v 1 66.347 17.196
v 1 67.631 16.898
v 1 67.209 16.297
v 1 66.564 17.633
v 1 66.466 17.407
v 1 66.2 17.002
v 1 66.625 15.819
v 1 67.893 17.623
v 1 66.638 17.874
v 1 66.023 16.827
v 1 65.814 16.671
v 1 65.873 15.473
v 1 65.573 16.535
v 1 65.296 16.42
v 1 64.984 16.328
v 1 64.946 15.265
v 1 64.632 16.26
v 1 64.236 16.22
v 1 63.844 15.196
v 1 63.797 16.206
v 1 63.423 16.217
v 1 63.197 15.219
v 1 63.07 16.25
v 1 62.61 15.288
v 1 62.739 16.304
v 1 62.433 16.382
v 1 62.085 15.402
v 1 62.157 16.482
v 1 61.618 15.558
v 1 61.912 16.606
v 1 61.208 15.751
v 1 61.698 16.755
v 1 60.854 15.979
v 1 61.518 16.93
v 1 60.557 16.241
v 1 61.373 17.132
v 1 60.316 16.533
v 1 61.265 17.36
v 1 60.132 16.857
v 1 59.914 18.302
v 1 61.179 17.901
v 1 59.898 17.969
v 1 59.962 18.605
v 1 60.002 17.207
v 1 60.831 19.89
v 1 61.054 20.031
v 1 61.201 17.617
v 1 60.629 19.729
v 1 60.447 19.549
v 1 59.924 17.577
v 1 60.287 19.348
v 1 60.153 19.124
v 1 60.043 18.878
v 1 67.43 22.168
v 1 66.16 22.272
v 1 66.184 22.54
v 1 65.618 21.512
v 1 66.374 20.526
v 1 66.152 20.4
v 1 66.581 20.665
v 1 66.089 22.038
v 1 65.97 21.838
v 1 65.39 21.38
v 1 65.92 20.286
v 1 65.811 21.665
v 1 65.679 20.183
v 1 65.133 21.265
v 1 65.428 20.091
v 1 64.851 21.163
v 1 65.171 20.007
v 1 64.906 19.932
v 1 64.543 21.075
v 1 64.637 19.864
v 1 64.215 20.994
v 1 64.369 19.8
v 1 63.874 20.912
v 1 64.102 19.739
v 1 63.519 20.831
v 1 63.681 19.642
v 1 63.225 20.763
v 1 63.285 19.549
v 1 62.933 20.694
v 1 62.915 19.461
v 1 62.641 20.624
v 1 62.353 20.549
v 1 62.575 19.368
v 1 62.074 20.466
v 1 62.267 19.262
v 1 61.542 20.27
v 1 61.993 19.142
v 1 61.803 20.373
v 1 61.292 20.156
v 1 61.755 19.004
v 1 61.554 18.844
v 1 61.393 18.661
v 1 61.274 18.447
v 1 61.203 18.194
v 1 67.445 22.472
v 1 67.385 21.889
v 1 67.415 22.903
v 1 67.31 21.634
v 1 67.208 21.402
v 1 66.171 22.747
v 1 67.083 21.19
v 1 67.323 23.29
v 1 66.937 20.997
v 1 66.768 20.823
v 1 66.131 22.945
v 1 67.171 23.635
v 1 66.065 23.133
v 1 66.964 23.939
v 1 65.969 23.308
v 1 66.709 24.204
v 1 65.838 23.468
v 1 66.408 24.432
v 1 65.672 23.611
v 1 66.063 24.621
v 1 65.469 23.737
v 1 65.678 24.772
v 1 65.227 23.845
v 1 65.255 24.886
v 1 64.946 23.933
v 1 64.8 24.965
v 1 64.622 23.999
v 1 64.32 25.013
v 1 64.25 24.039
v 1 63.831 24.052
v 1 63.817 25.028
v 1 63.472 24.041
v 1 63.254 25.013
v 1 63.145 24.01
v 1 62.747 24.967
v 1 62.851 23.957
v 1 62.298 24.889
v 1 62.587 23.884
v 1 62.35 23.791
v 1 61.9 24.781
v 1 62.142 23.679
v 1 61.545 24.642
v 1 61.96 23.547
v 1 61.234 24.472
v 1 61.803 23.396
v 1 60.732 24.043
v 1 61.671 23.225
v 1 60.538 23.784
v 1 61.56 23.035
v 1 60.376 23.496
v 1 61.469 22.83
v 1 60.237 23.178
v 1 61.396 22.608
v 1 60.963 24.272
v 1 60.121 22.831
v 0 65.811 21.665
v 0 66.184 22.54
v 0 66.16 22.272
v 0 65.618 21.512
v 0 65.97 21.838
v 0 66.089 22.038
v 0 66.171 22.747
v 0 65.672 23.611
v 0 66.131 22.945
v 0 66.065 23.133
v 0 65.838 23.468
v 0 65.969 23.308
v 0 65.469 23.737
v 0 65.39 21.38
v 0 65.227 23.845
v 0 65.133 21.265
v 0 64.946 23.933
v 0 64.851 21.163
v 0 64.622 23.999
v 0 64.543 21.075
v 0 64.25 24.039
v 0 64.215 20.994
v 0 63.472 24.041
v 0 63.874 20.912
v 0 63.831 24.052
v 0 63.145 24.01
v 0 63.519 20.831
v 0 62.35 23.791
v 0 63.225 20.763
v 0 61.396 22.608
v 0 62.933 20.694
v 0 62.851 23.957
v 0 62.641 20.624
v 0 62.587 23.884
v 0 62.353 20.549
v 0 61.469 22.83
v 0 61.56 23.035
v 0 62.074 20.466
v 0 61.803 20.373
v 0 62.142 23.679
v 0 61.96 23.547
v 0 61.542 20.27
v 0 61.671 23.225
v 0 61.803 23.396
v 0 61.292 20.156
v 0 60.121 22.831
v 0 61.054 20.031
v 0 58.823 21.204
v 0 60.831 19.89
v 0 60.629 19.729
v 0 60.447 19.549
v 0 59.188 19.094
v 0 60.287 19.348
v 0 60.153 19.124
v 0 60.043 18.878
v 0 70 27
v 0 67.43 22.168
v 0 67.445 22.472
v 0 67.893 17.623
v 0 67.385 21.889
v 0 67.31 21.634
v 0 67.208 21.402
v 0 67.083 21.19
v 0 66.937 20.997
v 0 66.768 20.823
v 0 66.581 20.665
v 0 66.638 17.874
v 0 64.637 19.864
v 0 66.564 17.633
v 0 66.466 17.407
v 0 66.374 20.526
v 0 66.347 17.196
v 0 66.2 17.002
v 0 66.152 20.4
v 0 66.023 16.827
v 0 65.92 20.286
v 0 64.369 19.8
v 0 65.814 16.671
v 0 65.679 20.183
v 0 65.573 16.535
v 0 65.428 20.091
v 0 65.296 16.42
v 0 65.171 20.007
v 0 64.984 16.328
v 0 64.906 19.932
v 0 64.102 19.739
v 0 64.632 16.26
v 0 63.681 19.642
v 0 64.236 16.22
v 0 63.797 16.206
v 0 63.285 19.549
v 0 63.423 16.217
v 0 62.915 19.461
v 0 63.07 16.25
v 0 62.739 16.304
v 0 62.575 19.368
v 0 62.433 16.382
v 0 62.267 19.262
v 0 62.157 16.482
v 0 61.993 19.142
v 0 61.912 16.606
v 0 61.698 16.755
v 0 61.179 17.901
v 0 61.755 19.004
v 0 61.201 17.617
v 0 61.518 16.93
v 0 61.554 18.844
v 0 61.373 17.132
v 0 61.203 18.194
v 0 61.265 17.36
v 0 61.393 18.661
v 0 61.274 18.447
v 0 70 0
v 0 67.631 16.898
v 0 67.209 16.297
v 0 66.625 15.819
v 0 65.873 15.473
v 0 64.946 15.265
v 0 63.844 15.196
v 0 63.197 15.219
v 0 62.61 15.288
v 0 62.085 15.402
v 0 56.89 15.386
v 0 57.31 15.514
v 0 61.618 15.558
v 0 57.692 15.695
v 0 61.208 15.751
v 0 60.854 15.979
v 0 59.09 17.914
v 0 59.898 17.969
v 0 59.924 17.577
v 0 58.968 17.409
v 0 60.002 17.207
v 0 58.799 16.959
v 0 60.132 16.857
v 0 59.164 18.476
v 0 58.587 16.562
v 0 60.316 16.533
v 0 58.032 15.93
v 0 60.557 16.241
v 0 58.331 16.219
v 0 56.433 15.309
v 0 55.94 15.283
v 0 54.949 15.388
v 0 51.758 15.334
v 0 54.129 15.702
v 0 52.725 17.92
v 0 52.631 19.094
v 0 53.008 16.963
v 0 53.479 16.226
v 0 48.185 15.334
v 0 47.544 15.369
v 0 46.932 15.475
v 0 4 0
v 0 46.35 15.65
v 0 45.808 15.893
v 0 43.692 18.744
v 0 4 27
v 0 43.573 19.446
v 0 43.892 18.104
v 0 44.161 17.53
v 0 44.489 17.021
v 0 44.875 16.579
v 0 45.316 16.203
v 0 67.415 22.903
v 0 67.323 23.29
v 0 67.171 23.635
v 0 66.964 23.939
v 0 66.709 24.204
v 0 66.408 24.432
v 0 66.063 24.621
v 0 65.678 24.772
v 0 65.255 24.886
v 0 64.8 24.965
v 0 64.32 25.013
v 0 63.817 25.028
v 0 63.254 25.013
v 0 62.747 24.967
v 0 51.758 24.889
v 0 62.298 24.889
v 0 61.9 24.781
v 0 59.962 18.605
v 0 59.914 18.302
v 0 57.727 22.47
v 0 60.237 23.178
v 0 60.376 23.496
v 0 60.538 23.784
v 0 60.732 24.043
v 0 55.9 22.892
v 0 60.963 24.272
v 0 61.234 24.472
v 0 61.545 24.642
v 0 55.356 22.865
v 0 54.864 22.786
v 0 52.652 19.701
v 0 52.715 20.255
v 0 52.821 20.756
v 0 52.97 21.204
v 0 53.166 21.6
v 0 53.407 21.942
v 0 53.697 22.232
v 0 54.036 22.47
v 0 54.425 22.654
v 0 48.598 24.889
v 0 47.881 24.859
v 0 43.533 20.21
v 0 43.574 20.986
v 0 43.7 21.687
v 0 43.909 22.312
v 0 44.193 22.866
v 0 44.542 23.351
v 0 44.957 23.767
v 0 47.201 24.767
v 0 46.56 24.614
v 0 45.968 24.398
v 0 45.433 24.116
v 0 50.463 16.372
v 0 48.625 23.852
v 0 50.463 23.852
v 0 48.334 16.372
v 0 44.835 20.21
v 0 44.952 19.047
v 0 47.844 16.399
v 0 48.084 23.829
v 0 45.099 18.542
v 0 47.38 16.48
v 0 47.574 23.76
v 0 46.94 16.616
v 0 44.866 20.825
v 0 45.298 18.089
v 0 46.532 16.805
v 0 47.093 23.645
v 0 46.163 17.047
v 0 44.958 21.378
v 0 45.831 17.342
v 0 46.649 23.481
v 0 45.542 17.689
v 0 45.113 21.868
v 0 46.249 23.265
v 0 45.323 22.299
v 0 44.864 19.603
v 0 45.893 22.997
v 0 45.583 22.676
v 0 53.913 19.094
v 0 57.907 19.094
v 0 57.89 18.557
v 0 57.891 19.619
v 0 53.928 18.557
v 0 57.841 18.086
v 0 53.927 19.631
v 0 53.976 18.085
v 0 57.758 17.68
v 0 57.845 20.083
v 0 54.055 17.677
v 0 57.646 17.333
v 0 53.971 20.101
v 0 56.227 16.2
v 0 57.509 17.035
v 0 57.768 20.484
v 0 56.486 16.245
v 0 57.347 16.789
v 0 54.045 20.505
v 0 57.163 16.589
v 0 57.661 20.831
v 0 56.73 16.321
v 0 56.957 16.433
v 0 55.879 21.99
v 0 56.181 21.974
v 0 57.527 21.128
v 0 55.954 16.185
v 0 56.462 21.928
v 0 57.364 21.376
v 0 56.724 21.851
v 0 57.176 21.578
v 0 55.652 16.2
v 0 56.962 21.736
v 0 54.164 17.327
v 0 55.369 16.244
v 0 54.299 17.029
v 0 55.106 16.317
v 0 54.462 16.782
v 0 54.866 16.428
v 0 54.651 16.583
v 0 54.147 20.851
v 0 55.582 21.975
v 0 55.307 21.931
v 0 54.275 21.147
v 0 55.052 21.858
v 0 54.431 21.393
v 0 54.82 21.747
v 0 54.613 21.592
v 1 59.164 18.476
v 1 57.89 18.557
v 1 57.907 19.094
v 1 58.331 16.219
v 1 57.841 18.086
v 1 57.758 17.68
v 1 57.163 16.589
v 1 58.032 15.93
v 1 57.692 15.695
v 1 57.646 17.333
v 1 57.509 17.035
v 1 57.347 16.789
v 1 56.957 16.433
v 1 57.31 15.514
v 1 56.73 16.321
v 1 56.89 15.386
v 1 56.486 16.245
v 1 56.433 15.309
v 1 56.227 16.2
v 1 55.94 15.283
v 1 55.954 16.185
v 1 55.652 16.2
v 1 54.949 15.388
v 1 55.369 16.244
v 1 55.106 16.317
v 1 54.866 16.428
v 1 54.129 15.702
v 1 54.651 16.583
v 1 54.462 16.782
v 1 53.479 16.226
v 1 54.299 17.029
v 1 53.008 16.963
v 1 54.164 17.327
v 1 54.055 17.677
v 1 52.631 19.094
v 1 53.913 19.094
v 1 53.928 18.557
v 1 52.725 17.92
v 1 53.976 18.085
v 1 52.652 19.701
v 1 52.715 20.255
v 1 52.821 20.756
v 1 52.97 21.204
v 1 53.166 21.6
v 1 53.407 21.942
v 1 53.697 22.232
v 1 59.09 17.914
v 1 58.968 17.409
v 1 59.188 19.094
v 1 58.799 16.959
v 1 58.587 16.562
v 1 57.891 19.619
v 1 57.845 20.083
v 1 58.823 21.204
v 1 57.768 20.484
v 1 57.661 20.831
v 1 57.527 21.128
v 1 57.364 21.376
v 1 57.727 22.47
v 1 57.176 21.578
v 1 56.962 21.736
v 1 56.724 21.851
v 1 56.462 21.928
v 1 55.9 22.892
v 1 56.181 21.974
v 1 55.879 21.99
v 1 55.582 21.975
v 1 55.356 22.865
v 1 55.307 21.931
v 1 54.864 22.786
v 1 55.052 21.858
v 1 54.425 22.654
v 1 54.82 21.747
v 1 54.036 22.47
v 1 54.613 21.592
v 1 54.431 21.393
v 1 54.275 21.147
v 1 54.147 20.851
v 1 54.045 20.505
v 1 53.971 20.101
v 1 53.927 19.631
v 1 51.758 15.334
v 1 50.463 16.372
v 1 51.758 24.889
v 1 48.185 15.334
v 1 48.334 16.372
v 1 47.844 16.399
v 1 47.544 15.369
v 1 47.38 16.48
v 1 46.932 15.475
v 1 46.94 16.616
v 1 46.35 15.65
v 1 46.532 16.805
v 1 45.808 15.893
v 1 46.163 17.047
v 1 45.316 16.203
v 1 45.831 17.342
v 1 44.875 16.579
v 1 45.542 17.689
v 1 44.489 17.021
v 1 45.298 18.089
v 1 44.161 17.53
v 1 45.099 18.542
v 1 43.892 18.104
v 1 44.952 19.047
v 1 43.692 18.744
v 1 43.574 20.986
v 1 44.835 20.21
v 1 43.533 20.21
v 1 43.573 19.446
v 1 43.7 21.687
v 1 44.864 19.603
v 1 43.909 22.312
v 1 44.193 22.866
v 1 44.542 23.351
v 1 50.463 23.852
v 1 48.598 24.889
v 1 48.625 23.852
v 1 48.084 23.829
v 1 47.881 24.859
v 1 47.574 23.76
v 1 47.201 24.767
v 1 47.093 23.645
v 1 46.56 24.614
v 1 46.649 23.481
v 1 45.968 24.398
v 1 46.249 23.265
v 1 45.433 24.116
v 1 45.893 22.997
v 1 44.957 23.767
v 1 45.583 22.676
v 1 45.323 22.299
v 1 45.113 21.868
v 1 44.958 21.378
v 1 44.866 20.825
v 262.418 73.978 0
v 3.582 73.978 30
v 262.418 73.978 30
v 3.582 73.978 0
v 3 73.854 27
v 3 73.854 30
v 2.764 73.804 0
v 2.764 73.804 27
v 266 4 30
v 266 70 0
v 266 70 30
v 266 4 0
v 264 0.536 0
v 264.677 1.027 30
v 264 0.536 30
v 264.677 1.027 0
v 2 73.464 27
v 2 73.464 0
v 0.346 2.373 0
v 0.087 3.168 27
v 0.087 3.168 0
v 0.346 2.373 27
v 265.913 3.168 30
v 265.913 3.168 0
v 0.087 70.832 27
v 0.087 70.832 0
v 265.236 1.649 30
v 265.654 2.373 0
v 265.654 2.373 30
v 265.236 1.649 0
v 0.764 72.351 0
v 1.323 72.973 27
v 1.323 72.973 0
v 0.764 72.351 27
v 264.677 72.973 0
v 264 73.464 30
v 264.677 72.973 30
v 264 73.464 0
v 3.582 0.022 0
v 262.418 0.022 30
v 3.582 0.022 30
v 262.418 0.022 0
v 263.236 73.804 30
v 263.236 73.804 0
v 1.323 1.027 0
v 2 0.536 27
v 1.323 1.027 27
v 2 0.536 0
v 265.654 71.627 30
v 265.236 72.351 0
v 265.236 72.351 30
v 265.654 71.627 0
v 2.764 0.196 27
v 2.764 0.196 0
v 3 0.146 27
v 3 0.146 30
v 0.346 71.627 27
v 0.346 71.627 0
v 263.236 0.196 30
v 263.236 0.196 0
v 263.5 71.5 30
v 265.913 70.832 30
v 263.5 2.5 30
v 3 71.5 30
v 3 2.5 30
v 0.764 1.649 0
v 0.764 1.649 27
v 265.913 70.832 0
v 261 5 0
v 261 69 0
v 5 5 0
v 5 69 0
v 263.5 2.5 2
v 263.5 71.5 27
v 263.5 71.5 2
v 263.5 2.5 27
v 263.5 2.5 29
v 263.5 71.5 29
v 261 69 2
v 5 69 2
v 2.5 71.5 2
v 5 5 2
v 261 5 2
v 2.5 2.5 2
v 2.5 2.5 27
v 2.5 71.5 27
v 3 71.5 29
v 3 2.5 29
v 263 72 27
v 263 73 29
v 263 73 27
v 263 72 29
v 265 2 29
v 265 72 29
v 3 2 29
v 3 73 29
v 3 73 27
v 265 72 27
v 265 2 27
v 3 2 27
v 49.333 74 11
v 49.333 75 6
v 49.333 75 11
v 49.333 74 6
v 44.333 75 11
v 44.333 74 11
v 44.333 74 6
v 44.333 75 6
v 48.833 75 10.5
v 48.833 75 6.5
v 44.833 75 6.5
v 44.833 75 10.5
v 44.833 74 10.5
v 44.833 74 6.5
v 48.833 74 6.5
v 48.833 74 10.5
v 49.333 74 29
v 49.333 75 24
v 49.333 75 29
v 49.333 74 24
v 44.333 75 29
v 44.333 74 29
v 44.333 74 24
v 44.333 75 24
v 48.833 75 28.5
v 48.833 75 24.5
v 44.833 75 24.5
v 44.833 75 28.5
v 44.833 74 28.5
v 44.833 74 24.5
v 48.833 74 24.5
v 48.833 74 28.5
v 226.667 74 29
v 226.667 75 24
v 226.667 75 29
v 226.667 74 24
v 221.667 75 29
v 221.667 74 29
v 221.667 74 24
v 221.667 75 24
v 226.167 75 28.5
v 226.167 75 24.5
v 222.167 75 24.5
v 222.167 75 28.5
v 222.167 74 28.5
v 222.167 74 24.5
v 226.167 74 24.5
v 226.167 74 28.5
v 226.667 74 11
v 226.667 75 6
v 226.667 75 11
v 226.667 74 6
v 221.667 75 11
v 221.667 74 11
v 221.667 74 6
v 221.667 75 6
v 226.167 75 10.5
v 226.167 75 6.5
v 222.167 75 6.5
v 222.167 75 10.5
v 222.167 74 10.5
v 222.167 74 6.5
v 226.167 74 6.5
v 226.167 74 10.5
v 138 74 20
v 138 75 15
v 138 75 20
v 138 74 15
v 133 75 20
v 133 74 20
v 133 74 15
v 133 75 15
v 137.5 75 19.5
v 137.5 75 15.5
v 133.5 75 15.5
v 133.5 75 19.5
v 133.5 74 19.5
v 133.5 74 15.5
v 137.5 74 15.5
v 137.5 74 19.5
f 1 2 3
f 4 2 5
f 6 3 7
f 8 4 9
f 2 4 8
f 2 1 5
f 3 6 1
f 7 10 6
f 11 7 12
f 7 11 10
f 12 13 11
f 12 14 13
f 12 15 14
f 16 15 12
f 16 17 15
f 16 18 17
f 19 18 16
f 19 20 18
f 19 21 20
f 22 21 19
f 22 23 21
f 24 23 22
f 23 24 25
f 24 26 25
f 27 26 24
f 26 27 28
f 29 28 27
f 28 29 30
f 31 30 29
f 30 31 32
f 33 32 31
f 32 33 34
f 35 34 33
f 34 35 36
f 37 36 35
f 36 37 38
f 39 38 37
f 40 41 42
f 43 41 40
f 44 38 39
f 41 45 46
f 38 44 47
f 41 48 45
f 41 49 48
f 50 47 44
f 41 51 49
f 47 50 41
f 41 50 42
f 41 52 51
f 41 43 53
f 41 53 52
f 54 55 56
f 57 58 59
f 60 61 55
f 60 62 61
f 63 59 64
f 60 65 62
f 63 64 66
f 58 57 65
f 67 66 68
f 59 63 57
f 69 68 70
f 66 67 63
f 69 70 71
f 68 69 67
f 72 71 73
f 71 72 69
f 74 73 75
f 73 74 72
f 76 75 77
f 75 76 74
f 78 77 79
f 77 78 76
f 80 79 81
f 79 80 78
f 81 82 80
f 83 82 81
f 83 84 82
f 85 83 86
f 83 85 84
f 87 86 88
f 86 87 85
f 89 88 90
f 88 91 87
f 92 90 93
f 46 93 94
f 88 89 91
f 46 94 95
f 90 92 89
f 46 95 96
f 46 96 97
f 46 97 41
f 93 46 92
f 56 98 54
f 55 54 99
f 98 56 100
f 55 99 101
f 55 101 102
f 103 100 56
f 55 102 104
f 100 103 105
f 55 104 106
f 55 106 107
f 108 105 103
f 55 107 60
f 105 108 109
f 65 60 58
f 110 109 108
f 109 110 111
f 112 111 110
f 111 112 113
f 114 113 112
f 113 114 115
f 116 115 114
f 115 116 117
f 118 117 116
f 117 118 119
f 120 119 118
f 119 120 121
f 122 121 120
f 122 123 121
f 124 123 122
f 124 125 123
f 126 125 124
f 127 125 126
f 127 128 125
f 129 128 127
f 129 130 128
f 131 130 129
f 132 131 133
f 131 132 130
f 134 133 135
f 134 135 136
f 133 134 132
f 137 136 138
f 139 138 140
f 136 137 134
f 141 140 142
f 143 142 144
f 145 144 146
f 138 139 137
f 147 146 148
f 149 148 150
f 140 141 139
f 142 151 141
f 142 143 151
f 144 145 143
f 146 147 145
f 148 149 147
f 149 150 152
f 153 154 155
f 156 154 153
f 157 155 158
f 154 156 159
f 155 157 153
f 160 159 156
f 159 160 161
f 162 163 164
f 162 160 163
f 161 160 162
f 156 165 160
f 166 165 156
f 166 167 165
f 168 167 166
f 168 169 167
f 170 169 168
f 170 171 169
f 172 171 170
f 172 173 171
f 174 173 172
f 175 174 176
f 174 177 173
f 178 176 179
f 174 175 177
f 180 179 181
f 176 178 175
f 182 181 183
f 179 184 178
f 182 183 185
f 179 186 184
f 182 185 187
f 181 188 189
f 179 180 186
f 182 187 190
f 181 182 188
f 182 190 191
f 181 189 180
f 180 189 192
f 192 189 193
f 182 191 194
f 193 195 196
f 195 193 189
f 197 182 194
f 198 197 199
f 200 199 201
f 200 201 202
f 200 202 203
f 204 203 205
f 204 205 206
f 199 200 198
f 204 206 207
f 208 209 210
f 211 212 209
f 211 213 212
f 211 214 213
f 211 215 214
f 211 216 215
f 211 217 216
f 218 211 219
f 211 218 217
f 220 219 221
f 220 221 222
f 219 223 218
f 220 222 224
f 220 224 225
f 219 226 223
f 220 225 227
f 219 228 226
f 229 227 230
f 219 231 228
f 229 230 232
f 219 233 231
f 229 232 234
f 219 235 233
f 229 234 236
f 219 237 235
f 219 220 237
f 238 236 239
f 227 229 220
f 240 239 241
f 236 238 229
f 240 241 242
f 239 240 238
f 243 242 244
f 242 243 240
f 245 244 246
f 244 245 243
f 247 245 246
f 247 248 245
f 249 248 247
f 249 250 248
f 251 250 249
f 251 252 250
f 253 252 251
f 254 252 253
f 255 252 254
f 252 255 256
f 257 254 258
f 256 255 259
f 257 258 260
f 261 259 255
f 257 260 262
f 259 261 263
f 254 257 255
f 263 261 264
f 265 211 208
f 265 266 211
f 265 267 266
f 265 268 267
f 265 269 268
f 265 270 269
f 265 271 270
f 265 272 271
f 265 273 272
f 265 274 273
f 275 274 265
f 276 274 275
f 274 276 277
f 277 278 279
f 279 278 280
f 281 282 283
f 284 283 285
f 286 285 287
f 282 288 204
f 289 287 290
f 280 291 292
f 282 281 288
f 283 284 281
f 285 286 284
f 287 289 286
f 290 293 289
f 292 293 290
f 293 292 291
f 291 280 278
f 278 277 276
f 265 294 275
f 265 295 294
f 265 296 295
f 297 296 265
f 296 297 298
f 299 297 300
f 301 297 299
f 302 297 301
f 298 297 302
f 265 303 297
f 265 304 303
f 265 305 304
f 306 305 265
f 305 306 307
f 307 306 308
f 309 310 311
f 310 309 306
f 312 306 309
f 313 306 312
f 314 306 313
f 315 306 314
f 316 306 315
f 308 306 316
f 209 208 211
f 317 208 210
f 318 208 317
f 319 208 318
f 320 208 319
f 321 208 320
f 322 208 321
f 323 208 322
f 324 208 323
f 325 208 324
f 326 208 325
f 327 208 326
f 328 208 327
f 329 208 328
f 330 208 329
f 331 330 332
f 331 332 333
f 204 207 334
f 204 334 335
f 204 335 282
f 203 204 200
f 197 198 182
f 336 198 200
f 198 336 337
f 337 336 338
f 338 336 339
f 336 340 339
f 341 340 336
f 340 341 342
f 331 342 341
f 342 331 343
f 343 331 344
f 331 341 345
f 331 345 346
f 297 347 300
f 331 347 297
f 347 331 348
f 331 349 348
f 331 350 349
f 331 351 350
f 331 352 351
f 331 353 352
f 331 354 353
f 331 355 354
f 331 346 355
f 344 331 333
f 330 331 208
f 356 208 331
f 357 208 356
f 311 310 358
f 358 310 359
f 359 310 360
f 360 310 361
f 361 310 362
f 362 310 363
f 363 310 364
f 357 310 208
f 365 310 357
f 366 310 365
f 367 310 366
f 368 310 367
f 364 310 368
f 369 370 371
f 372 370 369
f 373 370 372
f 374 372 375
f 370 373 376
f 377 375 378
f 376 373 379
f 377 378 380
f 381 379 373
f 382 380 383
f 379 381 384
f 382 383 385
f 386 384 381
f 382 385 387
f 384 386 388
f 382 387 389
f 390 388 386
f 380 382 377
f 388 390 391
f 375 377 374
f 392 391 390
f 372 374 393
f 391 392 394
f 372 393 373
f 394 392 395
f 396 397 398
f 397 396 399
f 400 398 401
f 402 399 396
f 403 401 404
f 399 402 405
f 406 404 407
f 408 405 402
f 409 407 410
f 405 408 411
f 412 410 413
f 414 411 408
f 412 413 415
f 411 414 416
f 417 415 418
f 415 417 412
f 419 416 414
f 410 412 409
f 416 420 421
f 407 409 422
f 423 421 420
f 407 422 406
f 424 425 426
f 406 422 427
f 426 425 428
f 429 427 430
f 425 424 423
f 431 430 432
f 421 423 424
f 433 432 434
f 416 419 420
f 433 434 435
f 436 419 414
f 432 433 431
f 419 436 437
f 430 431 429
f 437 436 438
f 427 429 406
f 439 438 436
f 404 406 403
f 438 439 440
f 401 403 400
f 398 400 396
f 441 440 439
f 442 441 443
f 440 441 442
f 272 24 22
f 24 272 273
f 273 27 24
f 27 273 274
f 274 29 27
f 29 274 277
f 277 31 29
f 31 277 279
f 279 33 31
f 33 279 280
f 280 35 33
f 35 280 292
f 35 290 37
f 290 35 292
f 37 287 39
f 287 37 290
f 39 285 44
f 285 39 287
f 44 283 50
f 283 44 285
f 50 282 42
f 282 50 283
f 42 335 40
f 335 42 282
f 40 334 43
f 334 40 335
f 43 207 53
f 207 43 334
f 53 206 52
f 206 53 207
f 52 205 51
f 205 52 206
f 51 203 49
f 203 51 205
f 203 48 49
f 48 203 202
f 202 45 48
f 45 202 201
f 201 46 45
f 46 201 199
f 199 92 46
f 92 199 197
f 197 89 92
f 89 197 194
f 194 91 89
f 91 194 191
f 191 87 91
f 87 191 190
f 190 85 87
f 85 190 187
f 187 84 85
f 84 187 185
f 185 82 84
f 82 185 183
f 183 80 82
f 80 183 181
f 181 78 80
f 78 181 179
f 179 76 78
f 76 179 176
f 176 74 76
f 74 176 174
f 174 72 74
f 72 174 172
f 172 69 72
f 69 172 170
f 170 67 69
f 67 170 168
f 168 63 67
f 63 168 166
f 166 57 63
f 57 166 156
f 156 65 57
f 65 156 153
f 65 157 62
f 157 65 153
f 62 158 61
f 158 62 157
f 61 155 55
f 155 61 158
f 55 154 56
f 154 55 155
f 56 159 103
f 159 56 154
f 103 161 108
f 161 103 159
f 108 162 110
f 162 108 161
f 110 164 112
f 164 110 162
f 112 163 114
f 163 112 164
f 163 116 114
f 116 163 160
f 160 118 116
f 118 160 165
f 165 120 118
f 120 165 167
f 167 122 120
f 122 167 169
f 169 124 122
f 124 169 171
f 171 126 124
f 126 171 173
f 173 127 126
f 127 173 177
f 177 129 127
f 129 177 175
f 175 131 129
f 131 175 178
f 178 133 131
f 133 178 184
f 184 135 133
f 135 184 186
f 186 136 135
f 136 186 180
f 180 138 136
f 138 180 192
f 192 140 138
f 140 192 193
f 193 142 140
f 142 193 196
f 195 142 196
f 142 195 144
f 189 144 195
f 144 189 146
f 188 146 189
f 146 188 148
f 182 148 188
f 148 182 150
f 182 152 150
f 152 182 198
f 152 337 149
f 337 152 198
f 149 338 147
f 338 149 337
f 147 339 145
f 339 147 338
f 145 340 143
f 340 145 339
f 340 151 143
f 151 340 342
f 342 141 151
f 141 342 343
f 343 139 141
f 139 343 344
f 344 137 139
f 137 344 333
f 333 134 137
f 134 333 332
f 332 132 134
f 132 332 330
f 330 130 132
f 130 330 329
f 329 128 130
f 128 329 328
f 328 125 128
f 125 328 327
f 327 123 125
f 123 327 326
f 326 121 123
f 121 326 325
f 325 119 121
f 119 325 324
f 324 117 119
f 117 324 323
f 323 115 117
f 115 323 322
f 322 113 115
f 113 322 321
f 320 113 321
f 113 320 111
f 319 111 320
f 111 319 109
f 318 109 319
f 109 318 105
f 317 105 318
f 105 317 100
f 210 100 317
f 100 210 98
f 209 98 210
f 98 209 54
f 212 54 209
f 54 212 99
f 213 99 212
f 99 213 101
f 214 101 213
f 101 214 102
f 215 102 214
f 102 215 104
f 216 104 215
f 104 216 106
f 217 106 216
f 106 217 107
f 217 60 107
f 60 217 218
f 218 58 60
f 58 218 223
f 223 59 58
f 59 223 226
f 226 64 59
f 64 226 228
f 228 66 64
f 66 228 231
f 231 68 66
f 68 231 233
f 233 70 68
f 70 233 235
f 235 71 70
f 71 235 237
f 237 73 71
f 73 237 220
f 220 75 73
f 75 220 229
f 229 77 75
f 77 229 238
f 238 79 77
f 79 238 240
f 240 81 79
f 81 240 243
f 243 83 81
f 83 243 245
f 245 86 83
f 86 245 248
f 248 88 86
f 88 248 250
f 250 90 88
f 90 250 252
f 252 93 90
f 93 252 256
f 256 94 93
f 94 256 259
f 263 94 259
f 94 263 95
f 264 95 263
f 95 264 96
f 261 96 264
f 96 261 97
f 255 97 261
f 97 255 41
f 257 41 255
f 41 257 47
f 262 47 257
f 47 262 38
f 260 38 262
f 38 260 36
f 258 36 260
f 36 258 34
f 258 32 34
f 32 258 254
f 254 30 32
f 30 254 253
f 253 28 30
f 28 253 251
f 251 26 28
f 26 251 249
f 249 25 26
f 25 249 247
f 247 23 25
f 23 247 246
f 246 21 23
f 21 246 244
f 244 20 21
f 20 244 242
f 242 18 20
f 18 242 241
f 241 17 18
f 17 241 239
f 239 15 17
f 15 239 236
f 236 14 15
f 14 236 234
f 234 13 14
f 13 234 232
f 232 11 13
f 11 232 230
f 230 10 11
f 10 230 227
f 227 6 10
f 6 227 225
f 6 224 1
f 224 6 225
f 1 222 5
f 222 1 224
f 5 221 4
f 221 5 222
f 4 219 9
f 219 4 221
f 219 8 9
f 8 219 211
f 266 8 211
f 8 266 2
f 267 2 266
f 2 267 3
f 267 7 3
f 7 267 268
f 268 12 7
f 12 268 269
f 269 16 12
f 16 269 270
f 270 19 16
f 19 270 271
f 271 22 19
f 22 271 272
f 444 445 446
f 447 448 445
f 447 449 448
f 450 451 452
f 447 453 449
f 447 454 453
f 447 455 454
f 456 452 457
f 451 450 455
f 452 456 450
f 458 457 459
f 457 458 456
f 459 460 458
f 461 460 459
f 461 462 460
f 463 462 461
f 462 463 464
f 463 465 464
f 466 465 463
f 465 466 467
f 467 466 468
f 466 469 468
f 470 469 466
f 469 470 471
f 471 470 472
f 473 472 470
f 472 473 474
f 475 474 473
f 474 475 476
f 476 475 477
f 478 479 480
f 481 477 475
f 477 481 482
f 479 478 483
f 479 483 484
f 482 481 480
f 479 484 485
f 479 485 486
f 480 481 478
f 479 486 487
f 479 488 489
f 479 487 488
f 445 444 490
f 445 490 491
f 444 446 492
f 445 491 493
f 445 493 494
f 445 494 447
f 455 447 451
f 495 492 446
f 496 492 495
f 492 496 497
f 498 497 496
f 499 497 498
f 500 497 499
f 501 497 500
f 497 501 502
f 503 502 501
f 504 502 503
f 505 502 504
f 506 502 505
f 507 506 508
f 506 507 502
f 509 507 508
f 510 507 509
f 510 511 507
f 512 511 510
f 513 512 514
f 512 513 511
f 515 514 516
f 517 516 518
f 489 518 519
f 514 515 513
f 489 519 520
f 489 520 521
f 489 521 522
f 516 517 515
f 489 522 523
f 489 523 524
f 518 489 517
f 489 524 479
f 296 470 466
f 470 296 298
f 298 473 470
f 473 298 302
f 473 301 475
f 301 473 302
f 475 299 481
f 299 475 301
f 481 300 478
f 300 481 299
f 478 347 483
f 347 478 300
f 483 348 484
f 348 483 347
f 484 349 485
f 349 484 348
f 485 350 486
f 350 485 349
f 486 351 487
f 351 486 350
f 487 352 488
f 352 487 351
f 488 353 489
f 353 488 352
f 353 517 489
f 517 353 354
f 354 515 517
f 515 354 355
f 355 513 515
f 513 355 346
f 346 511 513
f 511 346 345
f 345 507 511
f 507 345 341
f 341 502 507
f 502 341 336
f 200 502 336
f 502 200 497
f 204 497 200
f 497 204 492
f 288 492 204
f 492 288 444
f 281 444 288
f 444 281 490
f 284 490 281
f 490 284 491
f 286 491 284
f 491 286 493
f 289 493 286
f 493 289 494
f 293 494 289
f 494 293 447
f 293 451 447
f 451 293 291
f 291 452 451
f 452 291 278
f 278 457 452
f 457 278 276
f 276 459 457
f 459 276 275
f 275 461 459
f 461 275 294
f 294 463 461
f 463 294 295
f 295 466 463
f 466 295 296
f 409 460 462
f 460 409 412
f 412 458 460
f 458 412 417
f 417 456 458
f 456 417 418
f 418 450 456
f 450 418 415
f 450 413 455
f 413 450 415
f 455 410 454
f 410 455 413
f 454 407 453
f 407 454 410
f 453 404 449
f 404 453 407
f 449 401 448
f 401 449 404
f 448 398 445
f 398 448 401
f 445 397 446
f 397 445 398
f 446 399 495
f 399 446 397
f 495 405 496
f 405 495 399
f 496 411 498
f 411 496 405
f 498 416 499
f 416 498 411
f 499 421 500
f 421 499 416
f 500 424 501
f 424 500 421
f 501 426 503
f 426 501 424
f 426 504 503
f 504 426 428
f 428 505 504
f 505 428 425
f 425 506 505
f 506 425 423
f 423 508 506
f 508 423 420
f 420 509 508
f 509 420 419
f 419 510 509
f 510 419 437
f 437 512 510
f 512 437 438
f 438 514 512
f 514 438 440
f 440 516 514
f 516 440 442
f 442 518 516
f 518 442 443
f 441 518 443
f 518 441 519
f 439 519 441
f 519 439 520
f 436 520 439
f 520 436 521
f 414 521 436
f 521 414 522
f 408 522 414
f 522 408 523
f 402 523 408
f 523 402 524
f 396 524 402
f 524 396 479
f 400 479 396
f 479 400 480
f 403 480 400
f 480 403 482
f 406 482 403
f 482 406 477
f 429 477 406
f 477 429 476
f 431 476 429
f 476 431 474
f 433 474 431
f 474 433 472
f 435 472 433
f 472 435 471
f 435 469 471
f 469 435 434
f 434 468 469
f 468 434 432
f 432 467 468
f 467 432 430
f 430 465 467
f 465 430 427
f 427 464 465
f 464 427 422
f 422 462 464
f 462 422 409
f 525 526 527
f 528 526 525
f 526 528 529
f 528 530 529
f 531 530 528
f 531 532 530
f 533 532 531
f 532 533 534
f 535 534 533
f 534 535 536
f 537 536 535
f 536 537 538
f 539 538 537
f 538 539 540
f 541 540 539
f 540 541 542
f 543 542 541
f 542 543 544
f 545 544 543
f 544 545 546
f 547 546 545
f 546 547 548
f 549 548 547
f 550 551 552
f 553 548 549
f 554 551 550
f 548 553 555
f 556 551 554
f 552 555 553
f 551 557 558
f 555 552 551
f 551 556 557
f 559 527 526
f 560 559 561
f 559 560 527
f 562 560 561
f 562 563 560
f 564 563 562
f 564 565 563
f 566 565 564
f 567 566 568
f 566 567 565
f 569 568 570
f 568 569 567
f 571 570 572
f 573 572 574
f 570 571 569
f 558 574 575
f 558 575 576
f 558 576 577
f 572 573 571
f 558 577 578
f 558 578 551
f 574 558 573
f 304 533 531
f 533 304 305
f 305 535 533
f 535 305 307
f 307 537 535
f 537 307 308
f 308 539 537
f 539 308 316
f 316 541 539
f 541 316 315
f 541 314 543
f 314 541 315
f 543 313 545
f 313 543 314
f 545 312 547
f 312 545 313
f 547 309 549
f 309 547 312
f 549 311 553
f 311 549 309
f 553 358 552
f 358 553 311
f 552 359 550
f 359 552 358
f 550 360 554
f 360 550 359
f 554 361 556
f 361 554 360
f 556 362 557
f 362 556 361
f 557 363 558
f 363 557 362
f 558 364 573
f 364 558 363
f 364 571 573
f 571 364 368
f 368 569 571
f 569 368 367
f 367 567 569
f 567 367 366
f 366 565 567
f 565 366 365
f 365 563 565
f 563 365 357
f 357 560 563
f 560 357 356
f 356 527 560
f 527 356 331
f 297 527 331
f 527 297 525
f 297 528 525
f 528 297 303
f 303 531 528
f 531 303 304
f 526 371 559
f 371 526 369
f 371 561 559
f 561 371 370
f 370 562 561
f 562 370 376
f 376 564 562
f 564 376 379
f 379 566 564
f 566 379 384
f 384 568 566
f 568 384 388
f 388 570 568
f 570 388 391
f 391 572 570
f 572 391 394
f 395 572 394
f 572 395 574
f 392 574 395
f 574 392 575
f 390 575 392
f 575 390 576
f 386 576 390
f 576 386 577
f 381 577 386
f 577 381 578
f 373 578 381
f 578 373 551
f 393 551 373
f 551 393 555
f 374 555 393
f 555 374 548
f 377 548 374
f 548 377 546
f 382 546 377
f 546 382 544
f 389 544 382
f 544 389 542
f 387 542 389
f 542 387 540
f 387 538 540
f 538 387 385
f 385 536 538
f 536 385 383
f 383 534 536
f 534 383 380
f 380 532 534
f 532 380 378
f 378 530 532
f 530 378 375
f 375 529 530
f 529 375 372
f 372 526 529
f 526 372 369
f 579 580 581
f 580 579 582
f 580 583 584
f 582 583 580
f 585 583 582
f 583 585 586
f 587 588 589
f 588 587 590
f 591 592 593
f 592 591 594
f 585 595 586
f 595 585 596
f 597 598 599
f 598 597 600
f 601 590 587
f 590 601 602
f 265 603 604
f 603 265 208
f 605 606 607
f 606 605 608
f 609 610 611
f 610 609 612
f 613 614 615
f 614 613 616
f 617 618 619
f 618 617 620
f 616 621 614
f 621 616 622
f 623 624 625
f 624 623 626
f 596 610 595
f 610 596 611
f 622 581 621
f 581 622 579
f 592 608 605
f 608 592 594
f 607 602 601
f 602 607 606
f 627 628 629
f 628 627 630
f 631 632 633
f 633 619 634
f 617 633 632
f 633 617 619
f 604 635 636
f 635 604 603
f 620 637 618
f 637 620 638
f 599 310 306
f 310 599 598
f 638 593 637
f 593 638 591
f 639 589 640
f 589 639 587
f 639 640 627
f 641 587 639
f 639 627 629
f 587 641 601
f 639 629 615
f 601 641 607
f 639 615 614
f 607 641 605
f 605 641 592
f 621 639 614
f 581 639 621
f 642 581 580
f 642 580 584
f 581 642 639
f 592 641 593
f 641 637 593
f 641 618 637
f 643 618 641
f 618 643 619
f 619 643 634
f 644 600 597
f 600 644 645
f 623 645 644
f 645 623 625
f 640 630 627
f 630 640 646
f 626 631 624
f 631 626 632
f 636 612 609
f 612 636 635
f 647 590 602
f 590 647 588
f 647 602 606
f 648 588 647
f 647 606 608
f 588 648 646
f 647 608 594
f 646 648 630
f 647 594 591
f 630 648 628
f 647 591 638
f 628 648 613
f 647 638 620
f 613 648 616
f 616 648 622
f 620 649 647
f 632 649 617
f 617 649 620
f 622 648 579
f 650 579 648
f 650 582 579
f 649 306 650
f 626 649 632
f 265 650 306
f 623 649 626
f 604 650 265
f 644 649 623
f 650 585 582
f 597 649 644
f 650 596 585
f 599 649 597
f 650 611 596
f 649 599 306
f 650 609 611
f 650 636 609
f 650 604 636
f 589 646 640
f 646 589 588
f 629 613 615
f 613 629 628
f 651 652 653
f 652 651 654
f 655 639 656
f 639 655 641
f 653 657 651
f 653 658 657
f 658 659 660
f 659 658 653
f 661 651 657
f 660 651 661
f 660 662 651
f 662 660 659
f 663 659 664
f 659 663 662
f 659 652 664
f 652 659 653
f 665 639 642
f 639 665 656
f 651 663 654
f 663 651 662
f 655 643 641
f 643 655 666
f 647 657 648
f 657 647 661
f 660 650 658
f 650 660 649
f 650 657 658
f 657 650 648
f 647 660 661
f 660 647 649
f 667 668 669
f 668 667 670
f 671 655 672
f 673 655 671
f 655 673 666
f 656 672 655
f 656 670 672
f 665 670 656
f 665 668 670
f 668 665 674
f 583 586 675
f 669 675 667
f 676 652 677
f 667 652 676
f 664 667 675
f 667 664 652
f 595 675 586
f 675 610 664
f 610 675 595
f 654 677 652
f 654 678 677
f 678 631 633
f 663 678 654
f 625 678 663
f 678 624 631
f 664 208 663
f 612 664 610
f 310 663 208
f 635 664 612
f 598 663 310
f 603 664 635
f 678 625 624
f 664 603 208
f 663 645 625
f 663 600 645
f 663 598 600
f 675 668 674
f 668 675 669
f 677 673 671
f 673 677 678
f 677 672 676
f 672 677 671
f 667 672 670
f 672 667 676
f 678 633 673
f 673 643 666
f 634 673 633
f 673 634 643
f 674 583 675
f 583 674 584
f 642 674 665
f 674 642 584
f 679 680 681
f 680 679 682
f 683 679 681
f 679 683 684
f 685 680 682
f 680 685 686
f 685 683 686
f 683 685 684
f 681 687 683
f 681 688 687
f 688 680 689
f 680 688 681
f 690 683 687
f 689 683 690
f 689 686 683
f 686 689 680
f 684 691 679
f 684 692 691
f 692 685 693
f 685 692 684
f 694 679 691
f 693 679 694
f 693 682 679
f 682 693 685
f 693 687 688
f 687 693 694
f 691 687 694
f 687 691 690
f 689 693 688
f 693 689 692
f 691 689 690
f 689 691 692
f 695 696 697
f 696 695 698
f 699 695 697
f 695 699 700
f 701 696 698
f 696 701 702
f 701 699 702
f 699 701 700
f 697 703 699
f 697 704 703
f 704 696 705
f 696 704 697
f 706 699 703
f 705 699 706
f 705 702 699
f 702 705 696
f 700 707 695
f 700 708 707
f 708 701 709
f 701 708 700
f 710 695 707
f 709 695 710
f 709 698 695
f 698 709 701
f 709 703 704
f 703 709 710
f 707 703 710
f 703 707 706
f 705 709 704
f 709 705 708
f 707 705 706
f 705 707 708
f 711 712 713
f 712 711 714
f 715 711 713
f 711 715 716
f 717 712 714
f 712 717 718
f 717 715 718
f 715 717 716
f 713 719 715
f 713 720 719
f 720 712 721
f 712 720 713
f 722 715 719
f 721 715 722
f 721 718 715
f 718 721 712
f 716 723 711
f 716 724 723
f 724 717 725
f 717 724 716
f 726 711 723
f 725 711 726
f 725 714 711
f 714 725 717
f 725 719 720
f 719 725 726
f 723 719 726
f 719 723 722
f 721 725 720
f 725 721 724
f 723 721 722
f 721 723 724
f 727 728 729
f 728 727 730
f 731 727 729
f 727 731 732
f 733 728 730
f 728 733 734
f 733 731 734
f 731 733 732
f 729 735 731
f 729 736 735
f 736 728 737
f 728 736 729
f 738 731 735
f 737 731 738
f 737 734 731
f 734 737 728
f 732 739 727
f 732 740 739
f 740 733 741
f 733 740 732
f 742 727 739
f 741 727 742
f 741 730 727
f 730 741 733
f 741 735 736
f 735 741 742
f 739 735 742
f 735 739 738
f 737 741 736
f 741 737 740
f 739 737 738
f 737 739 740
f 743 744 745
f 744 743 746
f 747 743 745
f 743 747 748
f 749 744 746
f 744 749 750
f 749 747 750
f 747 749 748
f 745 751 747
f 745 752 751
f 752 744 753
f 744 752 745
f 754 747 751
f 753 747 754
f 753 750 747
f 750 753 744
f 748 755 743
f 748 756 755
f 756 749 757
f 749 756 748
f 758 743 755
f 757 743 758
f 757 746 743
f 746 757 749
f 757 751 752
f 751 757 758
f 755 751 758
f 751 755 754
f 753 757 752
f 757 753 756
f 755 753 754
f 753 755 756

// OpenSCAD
$m_length = 256;
$m_width = 64;
$m_height = 15;

$margin_x = 5;
$margin_y = 5;

$margin = ([$margin_x,$margin_y,0]);

$wall_strength = 5;
$wall = ([$wall_strength,$wall_strength,0]);

$box_l = $m_length+$margin_x+$wall_strength;
$box_w = $m_width+$margin_y+$wall_strength;
$box_h = 30;

$matrix = ([$m_length,$m_width,$box_h]);

$stand = ([5,1,5]);


font = "Liberation Sans";
letter_size = 10;
letter_height = 1;



difference() {
    // full case
    roundedcube($matrix+$wall+$margin,false,4,"z");
    //remove matrix+margin
    
    translate([$wall_strength/2,$wall_strength/2,2]) { 
        cube($matrix+$margin);
    }
    //remove matrix
    translate([$wall_strength, $wall_strength,0]) { 
        cube($matrix);
    }
    
    // insert
    translate([0,2,$box_h-3]) {
         cube([$box_l-3,$box_w-3,2]);
    }
    translate([$box_l-3,2,$box_h-3]) {
        cube([2,$box_w-4,2]);
    }
    translate([0,0,$box_h-3]) {
        cube([$wall_strength-2,$box_w,6]);
    }
    
    translate ([1,$box_w-10,$box_h-10]) {
        rotate([90, 0, 270]){
            letter("\u0053");
        }
        translate ([0,-8,-1]) {
            rotate([90, 0, 270]){
                letter("\u006F");
            }
        } 
        translate ([0,-16,0]) {
            rotate([90, 0, 270]){
                letter("\u0044");
            }
        }       
    }
    
}


//STAND
translate([$box_l/6,$box_w,$box_h/5]) {
    difference() {
        cube($stand);
        translate([0.5,0,0.5]) {
            cube($stand-[1,0,1]);
        }
    }
}
translate([$box_l/6,$box_w,$box_h-$box_h/5]) {
    difference() {
        cube($stand);
        translate([0.5,0,0.5]) {
            cube($stand-[1,0,1]);
        }
    }
}
translate([$box_l-$box_l/6,$box_w,$box_h-$box_h/5]) {
    difference() {
        cube($stand);
        translate([0.5,0,0.5]) {
            cube($stand-[1,0,1]);
        }
    }
}
translate([$box_l-$box_l/6,$box_w,$box_h/5]) {
    difference() {
        cube($stand);
        translate([0.5,0,0.5]) {
            cube($stand-[1,0,1]);
        }
    }
}
translate([$box_l/2,$box_w,$box_h/2]) {
    difference() {
        cube($stand);
        translate([0.5,0,0.5]) {
            cube($stand-[1,0,1]);
        }
    }
}


// BACKPLANE

/*
$backplane_dim = $matrix+$wall+$margin;
translate([0,0,7]) { 
$backplane = $backplane_dim-[0,0,3.8];

      translate([0.4,0.4,-1.5]) {
        cylinder($fn=100, r=0.15);
    }
        translate([0.4,$box_w+1-0.4,-1.5]) {
        cylinder($fn=100, r=0.15);
    }
        translate([$box_l+1-0.4,0.4,-1.5]) {
        cylinder($fn=100, r=0.15);
    }
        translate([$box_l+1-0.4,$box_w+1-0.4,-1.5]) {
        cylinder($fn=100, r=0.15);
    }  
    difference() {
        roundedcube($backplane,false,0.4,"z");
        translate([$box_l/2+1,$box_w+0.25,-1]) {
            cylinder($fn=100, r=0.15);
    }  
        translate([$box_l/2+0.85,$box_w+0.25,-0.75]) {
            cube([0.3,1.5,0.5]);
    } 
 
        translate([0,0,-0.3]) {   
            cube($backplane+[0,0,1]);
        }
    }

}
*/

//SPACER
/*translate([0.5,0.5,7]) {
  // difference() {
        cube($matrix+$margin-[0,0,2]);
    //    translate(0.5,0.5,0) {
     //       cube($matrix-[0,0,2]);
        //}
   // }
}
*/

/*difference() 
   {
       cube([10,5,10]);
       translate([0.5,0.5,0.5]) {
           cube([10,5,10]);
       }
       translate([2.5,2.5,0]) {
       cylinder($fn = 100, r=0.2);
       }
}*/






module letter(l) {
	// Use linear_extrude() to make the letters 3D objects as they
	// are only 2D shapes when only using text()
	linear_extrude(height = letter_height) {
		text(l, size = letter_size, font = font, halign = "center", valign = "center", $fn = 16);
	}
}

// Higher definition curves
$fs = 0.01;

module roundedcube(size = [1, 1, 1], center = false, radius = 0.5, apply_to = "all") {
	// If single value, convert to [x, y, z] vector
	size = (size[0] == undef) ? [size, size, size] : size;

	translate_min = radius;
	translate_xmax = size[0] - radius;
	translate_ymax = size[1] - radius;
	translate_zmax = size[2] - radius;

	diameter = radius * 2;

	module build_point(type = "sphere", rotate = [0, 0, 0]) {
		if (type == "sphere") {
			sphere(r = radius);
		} else if (type == "cylinder") {
			rotate(a = rotate)
			cylinder(h = diameter, r = radius, center = true);
		}
	}

	obj_translate = (center == false) ?
		[0, 0, 0] : [
			-(size[0] / 2),
			-(size[1] / 2),
			-(size[2] / 2)
		];

	translate(v = obj_translate) {
		hull() {
			for (translate_x = [translate_min, translate_xmax]) {
				x_at = (translate_x == translate_min) ? "min" : "max";
				for (translate_y = [translate_min, translate_ymax]) {
					y_at = (translate_y == translate_min) ? "min" : "max";
					for (translate_z = [translate_min, translate_zmax]) {
						z_at = (translate_z == translate_min) ? "min" : "max";

						translate(v = [translate_x, translate_y, translate_z])
						if (
							(apply_to == "all") ||
							(apply_to == "xmin" && x_at == "min") || (apply_to == "xmax" && x_at == "max") ||
							(apply_to == "ymin" && y_at == "min") || (apply_to == "ymax" && y_at == "max") ||
							(apply_to == "zmin" && z_at == "min") || (apply_to == "zmax" && z_at == "max")
						) {
							build_point("sphere");
						} else {
							rotate = 
								(apply_to == "xmin" || apply_to == "xmax" || apply_to == "x") ? [0, 90, 0] : (
								(apply_to == "ymin" || apply_to == "ymax" || apply_to == "y") ? [90, 90, 0] :
								[0, 0, 0]
							);
							build_point("cylinder", rotate);
						}
					}
				}
			}
		}
	}
}
